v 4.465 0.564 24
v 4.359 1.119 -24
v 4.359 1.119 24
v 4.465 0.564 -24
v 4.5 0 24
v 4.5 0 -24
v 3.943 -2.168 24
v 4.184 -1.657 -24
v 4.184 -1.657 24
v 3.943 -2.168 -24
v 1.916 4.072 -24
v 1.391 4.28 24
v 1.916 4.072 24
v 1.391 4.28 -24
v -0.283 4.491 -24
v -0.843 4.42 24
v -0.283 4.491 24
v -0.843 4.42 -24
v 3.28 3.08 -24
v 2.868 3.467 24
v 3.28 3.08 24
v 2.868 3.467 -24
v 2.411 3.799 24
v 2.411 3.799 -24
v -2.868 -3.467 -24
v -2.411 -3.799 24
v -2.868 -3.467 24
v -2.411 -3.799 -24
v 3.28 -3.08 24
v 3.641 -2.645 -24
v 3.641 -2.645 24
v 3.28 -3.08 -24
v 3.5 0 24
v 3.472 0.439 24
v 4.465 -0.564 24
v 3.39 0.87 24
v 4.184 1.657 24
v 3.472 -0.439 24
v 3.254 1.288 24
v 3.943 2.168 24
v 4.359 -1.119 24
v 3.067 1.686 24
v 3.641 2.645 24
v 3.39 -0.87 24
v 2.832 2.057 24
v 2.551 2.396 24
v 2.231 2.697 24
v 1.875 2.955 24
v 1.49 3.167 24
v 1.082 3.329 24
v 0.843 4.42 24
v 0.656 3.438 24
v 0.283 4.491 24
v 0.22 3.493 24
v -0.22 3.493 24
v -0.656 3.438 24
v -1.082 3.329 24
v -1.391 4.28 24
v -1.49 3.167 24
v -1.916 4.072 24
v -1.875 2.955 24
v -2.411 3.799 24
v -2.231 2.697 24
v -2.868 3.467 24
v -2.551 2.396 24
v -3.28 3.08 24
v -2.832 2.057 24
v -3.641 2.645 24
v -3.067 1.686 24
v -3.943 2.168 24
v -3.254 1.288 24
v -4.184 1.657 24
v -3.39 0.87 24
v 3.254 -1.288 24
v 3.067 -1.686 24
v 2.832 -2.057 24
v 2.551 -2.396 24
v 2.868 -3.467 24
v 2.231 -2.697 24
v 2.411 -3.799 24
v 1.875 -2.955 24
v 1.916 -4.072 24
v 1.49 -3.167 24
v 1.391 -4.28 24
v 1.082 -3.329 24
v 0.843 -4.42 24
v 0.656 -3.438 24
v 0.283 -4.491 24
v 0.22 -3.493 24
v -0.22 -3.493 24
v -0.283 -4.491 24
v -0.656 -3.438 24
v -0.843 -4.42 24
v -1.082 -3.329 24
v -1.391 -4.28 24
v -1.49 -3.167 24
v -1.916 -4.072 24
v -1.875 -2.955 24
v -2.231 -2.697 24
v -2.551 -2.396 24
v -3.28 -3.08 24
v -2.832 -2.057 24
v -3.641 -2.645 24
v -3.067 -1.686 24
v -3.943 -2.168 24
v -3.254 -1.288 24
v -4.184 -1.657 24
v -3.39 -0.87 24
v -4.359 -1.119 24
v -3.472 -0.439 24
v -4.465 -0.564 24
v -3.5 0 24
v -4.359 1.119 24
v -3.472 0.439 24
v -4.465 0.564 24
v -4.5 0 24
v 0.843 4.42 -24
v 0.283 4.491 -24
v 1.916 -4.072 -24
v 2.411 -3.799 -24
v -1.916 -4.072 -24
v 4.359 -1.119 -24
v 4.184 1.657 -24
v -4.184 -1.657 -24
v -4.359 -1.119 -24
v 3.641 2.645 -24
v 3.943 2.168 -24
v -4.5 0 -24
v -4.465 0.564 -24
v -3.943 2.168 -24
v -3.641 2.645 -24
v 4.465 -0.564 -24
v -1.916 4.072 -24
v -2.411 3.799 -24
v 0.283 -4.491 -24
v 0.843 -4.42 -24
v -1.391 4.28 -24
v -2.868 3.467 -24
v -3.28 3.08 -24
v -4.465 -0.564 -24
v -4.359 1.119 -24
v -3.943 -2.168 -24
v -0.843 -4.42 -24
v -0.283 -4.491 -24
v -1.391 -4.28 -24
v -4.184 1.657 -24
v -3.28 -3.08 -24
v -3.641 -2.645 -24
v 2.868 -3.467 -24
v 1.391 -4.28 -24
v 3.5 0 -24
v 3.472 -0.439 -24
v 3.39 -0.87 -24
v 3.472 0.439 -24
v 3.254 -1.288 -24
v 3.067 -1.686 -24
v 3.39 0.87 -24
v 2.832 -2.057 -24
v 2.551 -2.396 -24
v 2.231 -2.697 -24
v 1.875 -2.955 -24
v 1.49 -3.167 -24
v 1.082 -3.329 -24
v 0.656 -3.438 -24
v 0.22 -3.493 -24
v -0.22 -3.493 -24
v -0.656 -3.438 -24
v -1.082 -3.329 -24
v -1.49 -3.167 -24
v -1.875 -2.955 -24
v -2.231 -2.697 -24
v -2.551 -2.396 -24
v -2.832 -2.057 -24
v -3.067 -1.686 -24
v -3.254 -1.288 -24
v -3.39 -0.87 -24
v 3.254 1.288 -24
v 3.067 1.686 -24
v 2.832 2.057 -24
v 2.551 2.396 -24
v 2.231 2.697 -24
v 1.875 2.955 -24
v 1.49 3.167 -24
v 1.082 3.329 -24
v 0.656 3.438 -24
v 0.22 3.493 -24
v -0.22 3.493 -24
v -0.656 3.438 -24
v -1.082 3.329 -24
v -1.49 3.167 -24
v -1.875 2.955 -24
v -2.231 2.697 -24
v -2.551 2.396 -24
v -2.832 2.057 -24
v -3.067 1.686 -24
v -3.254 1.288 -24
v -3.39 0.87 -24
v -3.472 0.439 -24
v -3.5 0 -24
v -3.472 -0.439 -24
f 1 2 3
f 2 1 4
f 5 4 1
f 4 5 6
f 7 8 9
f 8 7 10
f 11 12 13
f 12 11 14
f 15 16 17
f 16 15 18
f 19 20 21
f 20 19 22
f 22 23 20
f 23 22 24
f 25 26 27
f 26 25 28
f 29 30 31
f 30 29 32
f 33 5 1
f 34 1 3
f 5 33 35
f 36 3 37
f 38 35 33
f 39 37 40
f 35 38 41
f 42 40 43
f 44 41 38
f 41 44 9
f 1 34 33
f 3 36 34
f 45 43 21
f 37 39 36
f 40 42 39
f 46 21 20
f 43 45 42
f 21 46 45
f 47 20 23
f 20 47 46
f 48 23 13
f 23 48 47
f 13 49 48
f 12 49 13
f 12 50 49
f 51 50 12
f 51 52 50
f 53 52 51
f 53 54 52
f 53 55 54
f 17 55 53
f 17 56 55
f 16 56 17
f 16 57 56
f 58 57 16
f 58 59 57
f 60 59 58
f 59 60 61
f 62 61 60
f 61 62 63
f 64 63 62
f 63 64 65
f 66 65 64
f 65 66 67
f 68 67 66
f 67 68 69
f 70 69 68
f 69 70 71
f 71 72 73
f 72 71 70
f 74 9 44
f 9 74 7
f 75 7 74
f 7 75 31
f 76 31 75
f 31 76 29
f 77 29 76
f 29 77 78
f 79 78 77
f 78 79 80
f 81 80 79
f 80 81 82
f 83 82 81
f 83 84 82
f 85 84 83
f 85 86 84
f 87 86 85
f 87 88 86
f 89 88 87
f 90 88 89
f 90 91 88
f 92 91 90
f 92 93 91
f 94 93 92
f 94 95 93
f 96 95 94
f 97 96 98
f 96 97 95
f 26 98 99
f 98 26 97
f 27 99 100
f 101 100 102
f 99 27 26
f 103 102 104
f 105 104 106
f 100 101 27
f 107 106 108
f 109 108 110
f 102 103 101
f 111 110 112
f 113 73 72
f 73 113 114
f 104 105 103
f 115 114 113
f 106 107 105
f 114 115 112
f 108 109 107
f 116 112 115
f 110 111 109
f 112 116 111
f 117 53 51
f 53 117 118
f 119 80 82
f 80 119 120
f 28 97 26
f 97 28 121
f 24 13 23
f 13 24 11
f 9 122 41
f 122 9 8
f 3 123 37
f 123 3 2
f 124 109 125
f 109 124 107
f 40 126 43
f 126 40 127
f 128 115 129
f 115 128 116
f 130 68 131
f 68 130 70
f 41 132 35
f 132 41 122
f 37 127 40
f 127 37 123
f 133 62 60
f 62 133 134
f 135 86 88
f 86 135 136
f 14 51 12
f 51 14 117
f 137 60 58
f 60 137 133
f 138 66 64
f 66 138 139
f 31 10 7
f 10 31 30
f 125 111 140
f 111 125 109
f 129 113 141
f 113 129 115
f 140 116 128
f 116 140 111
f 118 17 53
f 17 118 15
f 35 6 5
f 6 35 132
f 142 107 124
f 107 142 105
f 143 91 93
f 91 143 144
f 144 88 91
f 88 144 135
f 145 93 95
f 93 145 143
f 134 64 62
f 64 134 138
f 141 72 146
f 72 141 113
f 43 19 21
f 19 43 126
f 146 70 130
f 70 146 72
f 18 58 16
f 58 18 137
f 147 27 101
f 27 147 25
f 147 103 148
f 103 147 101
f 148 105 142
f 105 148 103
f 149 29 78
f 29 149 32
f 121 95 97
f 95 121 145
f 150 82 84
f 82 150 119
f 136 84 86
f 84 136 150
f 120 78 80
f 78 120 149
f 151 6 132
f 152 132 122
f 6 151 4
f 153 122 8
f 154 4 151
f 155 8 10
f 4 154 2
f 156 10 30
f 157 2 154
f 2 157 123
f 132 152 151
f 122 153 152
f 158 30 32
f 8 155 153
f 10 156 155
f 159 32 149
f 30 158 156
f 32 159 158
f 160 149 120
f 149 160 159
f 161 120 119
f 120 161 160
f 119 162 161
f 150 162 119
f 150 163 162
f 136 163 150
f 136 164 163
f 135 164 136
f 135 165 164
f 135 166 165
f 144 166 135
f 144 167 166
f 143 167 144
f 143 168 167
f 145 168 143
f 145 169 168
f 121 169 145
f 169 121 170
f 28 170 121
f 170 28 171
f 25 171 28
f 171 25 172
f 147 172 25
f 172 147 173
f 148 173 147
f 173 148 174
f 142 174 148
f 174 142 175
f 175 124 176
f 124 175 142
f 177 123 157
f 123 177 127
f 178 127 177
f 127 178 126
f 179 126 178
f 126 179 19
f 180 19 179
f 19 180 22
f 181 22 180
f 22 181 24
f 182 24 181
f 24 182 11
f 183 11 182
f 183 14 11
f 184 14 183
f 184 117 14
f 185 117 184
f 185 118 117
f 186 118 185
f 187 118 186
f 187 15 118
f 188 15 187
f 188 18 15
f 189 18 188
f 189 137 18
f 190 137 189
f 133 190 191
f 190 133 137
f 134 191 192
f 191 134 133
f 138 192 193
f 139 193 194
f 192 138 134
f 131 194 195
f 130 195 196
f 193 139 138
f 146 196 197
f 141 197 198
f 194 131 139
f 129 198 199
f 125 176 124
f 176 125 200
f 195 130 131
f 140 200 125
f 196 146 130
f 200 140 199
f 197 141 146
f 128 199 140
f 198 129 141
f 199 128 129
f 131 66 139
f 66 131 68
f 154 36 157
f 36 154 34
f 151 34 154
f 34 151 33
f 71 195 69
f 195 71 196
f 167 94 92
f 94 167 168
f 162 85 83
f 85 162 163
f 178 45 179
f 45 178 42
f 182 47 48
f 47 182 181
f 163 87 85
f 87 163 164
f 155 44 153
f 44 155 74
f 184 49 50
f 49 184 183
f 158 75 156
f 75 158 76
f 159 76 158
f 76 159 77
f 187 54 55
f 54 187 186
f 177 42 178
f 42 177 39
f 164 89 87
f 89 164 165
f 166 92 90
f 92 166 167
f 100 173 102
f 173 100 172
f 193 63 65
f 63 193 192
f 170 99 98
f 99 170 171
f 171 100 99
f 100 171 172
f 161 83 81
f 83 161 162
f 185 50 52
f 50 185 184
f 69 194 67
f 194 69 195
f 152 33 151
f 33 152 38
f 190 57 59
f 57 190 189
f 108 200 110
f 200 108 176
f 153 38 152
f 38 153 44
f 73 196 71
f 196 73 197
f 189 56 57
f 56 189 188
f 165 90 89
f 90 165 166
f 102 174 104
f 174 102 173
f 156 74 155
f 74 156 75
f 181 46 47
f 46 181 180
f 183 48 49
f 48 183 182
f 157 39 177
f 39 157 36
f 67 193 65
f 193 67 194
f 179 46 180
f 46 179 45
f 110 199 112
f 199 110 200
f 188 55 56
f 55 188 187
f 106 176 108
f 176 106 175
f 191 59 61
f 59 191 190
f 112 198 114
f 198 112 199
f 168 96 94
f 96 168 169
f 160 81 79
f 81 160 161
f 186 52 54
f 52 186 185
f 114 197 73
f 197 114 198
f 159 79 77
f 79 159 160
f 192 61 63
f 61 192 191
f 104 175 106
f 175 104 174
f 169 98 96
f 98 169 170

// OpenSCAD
$fn = 50;


difference() {
	union() {
		translate(v = [0, 0, -24.0000000000]) {
			cylinder(h = 48, r = 4.5000000000);
		}
	}
	union() {
		translate(v = [0, 0, -100.0000000000]) {
			cylinder(h = 200, r = 3.5000000000);
		}
	}
}
